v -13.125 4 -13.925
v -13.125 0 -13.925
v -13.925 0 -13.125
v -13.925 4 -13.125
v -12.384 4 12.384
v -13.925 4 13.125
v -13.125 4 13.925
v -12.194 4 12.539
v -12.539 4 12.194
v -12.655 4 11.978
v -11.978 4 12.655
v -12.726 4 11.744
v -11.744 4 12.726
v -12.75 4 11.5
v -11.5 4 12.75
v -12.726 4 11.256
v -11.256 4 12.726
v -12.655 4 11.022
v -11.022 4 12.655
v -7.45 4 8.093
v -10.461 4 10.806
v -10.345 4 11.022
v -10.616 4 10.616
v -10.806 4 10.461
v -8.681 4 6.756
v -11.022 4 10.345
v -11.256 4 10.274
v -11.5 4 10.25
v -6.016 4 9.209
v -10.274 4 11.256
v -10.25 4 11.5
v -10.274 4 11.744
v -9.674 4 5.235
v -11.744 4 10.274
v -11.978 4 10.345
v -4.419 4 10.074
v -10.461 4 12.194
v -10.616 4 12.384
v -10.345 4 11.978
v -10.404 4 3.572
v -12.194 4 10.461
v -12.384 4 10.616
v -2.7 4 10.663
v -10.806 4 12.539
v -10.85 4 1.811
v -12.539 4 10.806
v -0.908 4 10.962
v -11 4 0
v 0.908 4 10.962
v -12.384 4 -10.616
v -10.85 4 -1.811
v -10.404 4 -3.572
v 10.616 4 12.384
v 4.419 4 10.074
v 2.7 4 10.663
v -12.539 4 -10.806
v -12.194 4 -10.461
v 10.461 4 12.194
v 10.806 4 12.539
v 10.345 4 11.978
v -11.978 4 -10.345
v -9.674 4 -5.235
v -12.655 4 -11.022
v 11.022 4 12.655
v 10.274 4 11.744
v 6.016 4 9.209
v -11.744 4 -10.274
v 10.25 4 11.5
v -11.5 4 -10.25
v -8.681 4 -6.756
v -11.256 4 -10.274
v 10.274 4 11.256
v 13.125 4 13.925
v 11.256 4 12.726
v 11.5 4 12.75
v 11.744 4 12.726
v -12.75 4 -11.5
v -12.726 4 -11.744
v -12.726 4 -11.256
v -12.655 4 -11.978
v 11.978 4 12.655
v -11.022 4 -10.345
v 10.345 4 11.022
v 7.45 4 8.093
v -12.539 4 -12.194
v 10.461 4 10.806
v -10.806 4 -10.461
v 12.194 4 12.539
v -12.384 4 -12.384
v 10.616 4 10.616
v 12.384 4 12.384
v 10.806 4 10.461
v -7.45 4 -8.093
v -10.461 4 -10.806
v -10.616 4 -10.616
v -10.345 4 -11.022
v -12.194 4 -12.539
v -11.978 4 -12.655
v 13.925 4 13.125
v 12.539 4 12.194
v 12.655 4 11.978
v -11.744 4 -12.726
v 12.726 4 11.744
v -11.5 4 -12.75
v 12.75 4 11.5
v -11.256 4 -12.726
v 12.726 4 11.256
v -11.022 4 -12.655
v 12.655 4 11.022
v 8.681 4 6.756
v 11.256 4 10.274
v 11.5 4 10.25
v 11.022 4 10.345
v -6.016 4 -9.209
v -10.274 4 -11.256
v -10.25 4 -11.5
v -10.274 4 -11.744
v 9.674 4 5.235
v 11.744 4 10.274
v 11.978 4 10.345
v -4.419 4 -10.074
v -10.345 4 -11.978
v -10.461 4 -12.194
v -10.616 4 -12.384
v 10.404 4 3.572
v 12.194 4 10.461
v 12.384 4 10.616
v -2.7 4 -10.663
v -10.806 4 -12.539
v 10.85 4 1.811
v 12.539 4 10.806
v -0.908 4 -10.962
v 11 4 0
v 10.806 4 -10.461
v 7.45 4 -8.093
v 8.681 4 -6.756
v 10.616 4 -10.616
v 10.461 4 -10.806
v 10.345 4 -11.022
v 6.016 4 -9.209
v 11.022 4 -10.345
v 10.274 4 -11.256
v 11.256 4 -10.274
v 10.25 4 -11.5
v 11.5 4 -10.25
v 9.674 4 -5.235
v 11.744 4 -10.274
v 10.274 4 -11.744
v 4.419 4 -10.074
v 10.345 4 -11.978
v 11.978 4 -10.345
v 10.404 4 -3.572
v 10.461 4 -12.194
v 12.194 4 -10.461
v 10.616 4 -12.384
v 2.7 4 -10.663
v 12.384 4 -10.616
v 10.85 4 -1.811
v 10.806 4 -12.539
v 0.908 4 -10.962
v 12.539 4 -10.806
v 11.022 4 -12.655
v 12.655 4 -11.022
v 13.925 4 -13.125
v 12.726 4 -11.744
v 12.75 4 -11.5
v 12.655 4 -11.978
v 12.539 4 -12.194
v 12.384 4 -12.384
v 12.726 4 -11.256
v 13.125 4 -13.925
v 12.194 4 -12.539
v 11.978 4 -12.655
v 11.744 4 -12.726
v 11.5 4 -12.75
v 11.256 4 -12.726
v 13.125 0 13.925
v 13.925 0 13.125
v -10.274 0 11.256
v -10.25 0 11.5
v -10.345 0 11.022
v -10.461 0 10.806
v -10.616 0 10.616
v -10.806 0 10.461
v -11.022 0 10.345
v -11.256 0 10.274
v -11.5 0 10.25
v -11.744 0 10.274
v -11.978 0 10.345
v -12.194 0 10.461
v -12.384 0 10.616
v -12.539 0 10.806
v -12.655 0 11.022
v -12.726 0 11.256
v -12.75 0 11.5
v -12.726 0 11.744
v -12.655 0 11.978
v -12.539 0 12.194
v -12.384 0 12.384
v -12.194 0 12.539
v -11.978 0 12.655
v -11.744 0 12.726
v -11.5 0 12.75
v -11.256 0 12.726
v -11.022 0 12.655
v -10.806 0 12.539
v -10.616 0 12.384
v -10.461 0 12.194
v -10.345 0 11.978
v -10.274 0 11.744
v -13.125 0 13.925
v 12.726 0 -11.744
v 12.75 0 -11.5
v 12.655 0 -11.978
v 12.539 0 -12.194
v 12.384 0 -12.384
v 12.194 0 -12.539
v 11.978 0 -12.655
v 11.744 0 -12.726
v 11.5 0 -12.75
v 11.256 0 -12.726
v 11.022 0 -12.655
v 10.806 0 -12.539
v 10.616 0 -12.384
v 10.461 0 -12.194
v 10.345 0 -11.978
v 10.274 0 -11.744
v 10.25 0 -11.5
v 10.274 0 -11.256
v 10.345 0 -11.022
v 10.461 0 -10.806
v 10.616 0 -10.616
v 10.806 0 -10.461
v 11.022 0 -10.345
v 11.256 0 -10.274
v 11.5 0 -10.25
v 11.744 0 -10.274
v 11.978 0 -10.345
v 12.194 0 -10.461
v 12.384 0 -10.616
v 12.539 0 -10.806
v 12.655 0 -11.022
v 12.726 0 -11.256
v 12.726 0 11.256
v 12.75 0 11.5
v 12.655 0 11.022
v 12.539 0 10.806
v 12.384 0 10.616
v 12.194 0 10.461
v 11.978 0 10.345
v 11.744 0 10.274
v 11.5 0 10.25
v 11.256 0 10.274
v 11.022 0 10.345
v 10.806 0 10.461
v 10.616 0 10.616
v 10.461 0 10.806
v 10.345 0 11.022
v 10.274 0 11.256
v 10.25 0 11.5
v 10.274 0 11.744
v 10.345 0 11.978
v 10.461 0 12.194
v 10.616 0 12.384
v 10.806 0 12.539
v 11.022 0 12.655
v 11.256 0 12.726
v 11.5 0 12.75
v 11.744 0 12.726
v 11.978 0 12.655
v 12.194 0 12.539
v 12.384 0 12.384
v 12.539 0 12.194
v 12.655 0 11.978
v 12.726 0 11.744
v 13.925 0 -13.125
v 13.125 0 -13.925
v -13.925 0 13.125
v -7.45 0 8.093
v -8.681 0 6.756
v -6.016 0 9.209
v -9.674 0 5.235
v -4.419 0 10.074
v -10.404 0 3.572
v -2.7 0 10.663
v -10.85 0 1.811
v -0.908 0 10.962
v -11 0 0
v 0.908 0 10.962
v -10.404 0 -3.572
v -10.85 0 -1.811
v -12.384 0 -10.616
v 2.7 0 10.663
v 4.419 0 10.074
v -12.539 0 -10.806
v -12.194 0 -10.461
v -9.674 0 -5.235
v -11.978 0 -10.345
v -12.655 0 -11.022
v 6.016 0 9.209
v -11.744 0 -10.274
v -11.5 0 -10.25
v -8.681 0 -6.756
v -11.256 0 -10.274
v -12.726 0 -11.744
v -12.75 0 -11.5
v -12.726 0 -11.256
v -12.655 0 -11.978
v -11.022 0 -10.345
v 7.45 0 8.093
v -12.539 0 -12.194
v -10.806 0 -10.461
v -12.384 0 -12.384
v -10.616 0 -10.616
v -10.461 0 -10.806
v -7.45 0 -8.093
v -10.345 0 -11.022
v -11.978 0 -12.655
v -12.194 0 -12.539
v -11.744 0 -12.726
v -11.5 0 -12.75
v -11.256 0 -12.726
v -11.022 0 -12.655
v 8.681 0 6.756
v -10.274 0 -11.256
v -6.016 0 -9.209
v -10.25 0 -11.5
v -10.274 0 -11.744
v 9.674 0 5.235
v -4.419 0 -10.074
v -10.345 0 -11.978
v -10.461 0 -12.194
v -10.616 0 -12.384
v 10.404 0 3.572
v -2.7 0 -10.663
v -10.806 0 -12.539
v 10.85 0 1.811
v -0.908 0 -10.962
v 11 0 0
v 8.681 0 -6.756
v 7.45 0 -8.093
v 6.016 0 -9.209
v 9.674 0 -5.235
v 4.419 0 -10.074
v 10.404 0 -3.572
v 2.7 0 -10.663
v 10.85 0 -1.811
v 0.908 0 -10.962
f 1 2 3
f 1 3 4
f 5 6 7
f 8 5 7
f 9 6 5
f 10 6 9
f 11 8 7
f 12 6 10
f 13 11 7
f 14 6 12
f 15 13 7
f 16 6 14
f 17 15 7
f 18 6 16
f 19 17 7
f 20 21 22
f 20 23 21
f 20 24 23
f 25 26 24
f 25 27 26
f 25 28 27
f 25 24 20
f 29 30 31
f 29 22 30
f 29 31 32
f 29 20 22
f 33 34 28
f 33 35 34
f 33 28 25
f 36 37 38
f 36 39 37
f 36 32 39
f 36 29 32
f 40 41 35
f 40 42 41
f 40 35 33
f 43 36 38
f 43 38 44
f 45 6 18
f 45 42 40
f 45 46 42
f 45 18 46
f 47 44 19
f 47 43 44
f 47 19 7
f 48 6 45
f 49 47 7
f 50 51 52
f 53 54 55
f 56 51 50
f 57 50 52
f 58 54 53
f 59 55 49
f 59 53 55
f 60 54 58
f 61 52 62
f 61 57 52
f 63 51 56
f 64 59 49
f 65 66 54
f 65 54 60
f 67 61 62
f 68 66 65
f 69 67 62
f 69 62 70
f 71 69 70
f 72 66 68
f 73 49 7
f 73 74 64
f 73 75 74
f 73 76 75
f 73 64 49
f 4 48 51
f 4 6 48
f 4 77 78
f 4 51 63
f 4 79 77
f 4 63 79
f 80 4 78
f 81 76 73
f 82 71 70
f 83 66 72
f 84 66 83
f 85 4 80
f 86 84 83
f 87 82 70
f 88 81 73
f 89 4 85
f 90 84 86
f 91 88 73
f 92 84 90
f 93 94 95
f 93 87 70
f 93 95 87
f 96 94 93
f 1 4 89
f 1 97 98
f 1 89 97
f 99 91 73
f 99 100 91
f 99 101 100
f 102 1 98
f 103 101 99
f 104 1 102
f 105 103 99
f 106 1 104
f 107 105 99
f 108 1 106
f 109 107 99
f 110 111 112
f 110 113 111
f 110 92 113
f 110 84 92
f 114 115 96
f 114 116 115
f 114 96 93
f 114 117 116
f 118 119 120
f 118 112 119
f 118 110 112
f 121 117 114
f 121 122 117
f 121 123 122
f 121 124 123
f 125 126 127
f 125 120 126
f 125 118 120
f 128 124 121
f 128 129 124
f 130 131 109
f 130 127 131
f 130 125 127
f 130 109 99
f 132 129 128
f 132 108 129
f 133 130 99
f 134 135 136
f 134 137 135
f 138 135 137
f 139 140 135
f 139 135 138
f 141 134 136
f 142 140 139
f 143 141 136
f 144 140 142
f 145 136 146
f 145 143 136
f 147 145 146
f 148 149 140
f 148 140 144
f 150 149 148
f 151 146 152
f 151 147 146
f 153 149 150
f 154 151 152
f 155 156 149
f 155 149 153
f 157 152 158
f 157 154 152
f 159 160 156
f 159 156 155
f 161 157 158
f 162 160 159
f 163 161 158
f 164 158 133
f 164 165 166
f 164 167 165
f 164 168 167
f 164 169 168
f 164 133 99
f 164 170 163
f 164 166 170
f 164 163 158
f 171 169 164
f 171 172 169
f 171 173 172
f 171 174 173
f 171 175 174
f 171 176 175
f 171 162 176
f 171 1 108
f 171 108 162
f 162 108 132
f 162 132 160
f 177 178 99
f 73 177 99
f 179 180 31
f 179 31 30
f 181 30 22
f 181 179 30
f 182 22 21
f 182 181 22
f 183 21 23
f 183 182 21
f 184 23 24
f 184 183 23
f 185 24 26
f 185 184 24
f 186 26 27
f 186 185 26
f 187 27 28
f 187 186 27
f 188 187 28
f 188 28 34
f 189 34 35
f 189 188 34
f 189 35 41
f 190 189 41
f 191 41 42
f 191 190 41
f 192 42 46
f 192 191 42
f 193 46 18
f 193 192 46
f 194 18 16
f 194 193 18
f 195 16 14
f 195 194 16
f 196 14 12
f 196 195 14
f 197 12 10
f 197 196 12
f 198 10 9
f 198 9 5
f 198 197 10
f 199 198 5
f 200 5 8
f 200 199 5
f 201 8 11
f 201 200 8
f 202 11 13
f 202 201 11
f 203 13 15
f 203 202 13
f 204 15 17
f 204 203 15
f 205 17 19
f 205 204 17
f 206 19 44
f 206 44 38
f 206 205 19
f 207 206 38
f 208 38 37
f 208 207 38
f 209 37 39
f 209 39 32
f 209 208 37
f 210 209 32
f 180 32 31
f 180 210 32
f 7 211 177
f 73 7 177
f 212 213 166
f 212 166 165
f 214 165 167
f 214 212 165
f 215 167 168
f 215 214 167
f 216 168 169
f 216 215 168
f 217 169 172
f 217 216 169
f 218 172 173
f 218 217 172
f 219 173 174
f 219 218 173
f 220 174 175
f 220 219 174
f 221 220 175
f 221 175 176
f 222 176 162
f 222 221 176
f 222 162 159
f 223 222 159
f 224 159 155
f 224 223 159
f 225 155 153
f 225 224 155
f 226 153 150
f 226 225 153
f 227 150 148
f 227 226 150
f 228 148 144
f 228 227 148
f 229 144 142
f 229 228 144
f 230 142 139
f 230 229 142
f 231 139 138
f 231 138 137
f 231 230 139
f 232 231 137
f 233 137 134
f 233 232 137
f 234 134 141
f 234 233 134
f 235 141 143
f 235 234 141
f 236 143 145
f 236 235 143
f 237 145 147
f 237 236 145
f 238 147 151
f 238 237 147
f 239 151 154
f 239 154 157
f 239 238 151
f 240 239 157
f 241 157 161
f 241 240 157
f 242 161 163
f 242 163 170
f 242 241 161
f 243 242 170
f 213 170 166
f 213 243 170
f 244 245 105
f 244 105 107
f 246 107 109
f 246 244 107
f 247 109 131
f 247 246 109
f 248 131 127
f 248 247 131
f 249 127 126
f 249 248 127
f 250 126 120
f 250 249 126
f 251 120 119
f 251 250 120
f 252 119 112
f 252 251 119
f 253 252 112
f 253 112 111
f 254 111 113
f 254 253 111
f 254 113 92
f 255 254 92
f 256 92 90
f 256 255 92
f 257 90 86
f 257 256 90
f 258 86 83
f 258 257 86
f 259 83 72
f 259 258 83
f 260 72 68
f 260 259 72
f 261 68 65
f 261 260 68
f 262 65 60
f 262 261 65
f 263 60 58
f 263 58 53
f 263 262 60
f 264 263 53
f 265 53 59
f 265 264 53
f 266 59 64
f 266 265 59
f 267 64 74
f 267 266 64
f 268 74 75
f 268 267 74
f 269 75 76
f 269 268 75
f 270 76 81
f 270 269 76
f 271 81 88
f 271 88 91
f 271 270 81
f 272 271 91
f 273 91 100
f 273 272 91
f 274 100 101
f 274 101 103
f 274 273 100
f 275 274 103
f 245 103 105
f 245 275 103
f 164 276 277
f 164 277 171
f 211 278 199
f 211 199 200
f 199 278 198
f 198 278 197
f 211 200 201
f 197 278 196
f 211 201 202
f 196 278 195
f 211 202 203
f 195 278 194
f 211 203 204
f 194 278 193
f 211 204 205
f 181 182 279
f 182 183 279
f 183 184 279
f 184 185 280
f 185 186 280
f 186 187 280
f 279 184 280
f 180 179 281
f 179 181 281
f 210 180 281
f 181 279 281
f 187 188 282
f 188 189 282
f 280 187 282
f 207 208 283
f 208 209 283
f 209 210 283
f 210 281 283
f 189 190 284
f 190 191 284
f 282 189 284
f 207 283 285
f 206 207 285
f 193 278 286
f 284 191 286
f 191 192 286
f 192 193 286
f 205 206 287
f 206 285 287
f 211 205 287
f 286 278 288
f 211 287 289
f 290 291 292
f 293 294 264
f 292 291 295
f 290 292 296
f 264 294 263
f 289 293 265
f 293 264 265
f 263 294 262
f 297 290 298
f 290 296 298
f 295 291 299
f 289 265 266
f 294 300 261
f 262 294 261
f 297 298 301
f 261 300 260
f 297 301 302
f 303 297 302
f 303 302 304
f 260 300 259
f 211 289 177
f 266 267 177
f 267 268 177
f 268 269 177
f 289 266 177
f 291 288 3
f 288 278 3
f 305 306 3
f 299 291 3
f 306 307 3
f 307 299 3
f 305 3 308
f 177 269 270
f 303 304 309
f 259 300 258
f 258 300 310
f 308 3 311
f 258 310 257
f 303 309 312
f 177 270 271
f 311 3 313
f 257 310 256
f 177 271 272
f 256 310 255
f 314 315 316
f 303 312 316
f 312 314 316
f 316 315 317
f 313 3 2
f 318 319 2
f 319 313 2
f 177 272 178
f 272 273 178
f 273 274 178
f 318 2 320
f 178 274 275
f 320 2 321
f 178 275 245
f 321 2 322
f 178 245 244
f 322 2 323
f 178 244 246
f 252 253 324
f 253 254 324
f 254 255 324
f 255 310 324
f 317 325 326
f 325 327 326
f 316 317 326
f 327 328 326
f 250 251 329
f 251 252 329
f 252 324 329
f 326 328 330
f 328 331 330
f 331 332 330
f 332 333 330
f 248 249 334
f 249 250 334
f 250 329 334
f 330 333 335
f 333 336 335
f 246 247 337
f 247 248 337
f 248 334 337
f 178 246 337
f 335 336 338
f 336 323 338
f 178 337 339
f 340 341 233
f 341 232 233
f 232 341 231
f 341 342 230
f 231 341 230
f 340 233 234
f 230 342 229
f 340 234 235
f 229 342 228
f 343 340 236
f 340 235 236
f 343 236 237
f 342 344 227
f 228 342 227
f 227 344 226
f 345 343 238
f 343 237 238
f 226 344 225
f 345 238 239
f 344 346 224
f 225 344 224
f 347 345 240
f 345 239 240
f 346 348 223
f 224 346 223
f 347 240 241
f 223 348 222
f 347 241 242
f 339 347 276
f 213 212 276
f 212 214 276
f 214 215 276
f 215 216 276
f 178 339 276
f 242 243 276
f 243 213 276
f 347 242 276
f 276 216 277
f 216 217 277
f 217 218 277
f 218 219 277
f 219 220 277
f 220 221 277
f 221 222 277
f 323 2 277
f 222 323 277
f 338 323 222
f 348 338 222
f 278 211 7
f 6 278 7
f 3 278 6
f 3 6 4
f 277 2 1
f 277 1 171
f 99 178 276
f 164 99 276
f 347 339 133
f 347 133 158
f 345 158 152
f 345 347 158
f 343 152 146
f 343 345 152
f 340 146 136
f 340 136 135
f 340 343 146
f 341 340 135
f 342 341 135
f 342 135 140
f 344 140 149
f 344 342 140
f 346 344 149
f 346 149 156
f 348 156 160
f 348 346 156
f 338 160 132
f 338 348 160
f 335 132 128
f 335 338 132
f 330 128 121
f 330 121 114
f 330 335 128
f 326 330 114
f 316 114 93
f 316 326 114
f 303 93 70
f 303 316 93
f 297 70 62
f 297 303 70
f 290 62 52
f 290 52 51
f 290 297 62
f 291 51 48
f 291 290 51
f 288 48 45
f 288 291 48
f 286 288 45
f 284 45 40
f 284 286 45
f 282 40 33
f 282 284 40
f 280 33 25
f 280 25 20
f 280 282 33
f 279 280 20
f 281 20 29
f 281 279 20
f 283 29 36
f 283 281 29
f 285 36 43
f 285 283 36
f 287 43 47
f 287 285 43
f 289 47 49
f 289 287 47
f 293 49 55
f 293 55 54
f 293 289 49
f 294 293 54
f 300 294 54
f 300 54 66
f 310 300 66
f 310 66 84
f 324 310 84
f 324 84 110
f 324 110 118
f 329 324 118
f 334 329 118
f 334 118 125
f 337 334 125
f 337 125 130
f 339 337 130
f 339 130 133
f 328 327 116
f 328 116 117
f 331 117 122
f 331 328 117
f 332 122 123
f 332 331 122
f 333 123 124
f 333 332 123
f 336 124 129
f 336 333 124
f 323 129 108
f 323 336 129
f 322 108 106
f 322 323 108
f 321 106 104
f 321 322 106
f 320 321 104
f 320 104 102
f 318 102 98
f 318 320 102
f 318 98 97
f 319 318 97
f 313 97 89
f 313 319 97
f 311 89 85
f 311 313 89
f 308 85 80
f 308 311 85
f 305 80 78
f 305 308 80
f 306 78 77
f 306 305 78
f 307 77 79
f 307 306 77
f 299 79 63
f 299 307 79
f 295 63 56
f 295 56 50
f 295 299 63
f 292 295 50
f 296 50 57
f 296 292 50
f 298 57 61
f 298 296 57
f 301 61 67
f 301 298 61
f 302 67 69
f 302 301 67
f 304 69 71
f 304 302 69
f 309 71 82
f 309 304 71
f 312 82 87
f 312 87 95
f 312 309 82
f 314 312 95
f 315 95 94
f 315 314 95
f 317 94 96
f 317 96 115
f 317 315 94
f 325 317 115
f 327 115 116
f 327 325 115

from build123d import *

# Parameters (mm, degrees)
SKETCH_2_W      = 27.85
SKETCH_2_H      = 27.85
SKETCH_2_R      = 1.25
SKETCH_2_R_2    = 11
EXTRUDE_1_DEPTH = 4
CHAMFER_1_SIZE  = 0.8


with BuildPart() as part:
    # Эскиз2 → Бобышка-Вытянуть1 (new body)
    with BuildSketch(Plane(origin=(0, 0, 0), x_dir=(1, 0, 0), z_dir=(0, 1, 0))):
        Rectangle(SKETCH_2_W, SKETCH_2_H)
        with Locations((-11.5, 11.5)):
            Circle(SKETCH_2_R, mode=Mode.SUBTRACT)
        with Locations((-11.5, -11.5)):
            Circle(SKETCH_2_R, mode=Mode.SUBTRACT)
        with Locations((11.5, -11.5)):
            Circle(SKETCH_2_R, mode=Mode.SUBTRACT)
        with Locations((11.5, 11.5)):
            Circle(SKETCH_2_R, mode=Mode.SUBTRACT)
        Circle(SKETCH_2_R_2, mode=Mode.SUBTRACT)
    extrude(amount=EXTRUDE_1_DEPTH)

    # Фаска1
    chamfer_1_edges = [part.edges().sort_by_distance(p)[0] for p in [
        (13.925, 2, -13.925),
        (13.925, 2, 13.925),
        (-13.925, 2, 13.925),
        (-13.925, 2, -13.925),
    ]]
    chamfer(chamfer_1_edges, length=CHAMFER_1_SIZE)


solid = part.part
